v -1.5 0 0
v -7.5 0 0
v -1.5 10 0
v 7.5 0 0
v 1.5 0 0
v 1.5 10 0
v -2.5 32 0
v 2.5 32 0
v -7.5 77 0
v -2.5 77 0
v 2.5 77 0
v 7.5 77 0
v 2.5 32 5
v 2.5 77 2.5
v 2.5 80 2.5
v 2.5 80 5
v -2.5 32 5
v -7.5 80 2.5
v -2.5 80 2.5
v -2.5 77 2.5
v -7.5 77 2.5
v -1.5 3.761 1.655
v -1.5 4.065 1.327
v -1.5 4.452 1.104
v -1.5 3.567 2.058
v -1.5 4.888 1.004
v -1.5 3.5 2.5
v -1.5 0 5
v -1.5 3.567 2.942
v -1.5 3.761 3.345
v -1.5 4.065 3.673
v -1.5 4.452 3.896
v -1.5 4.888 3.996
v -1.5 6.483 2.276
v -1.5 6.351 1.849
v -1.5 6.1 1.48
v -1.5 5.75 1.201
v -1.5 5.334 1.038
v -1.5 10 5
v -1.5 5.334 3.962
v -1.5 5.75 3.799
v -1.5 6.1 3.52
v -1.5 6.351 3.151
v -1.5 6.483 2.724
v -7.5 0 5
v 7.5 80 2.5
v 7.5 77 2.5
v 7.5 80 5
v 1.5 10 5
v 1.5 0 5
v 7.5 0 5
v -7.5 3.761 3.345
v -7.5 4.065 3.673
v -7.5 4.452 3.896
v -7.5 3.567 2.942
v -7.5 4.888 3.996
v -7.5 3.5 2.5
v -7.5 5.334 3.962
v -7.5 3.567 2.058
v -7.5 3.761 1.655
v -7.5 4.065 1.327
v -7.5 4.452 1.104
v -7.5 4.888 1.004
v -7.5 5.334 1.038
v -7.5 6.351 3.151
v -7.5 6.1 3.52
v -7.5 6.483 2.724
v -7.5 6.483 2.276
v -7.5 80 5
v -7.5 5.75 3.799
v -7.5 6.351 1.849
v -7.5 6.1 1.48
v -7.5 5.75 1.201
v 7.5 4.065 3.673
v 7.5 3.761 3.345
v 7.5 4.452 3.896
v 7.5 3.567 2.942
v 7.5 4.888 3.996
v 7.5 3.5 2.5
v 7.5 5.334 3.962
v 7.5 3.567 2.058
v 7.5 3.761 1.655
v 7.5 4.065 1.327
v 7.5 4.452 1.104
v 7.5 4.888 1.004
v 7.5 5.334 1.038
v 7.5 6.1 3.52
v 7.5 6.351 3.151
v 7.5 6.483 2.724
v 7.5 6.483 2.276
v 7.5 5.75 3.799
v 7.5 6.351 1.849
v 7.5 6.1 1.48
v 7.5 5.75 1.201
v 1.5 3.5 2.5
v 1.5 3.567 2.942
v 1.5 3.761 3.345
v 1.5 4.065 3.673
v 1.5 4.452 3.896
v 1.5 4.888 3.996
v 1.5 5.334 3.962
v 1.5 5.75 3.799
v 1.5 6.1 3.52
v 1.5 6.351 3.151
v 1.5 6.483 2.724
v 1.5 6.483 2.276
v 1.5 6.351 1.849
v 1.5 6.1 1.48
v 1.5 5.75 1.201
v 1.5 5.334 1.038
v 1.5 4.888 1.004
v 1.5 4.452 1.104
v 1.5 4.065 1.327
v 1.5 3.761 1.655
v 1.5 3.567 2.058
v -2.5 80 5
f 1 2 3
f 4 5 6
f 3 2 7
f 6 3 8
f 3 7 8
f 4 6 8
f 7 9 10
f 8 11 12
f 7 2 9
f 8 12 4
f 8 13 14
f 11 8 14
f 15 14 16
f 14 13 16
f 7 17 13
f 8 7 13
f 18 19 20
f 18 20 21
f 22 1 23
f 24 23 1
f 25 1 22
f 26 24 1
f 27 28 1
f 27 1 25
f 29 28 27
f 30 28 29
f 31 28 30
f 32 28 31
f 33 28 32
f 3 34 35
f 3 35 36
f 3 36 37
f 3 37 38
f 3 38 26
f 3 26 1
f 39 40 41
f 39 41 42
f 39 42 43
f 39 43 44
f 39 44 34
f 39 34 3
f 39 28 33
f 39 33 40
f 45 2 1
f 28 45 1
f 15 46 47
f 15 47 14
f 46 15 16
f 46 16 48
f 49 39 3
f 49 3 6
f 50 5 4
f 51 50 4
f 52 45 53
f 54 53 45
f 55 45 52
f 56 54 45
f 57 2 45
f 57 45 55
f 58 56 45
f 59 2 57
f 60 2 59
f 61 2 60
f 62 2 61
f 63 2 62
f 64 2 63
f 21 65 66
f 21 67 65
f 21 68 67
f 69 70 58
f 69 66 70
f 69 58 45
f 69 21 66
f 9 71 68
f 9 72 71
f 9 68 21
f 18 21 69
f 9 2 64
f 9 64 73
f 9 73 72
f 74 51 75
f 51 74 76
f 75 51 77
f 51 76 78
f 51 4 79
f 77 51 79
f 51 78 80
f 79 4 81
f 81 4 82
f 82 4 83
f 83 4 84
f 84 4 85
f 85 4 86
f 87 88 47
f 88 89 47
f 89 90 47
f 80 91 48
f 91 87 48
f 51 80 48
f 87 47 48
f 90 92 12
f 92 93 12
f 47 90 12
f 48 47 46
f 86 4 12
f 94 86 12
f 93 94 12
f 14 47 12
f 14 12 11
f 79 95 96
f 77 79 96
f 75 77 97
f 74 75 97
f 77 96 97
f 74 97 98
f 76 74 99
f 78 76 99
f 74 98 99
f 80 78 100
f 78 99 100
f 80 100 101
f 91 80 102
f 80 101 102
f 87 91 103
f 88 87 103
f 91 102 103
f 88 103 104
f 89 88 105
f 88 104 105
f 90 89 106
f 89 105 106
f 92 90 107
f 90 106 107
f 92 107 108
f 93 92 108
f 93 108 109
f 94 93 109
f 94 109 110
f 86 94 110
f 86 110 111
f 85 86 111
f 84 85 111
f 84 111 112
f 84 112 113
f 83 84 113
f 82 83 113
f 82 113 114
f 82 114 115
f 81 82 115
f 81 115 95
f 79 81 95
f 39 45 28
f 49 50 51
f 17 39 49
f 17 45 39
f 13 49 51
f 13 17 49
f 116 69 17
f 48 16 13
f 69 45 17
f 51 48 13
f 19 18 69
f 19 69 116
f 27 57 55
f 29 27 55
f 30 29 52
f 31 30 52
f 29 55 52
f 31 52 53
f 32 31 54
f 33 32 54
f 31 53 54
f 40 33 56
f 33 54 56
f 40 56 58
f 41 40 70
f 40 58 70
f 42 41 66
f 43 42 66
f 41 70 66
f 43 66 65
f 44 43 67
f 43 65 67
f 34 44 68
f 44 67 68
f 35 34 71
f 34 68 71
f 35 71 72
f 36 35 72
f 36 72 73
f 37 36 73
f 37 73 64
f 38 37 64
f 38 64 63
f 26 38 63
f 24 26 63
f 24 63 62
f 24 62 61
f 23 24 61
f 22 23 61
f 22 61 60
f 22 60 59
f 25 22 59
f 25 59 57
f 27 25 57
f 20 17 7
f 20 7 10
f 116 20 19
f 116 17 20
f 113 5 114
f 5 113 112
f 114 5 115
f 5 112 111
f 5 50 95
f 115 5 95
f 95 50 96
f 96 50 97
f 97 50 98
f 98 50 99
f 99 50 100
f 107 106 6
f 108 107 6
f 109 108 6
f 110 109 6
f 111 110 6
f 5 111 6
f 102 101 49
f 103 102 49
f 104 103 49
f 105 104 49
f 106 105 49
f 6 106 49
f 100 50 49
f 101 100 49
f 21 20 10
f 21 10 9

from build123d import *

# Parameters (mm, degrees)
F0_W     = 15
F0_H     = 80
F1_DEPTH = 5
F2_W     = 5
F2_H     = 48
F3_DEPTH = 25
F4_W     = 5
F4_H     = 2.5
F5_DEPTH = 3
F6_W     = 5
F6_H     = 2.5
F7_DEPTH = 3
F8_W     = 3
F8_H     = 10
F9_DEPTH = 25
F11_D    = 3


with BuildPart() as f1:
    # F0 (on Top) → F1 (new body)
    with BuildSketch(Plane.XY):
        with Locations((0, 40)):
            Rectangle(F0_W, F0_H)
    extrude(amount=F1_DEPTH)

    # F2 (on face) → F3 (cut)
    with BuildSketch(Plane.XY.offset(5)):
        with Locations((0, 56)):
            Rectangle(F2_W, F2_H)
    extrude(amount=-F3_DEPTH, mode=Mode.SUBTRACT)

    # F4 (on face) → F5 (cut)
    with BuildSketch(Plane(origin=(0, 80, 0), x_dir=(-1, 0, 0), z_dir=(0, 1, 0))):
        with Locations((5, 1.25)):
            Rectangle(F4_W, F4_H)
    extrude(amount=-F5_DEPTH, mode=Mode.SUBTRACT)

    # F6 (on face) → F7 (cut)
    with BuildSketch(Plane(origin=(0, 80, 0), x_dir=(-1, 0, 0), z_dir=(0, 1, 0))):
        with Locations((-5, 1.25)):
            Rectangle(F6_W, F6_H)
    extrude(amount=-F7_DEPTH, mode=Mode.SUBTRACT)

    # F8 (on face) → F9 (cut)
    with BuildSketch(Plane.XY.offset(5)):
        with Locations((0, 5)):
            Rectangle(F8_W, F8_H)
    extrude(amount=-F9_DEPTH, mode=Mode.SUBTRACT)

    # F11 (through all)
    with Locations(Plane.YZ.offset(7.5)):
        with Locations((5, 2.5)):
            Hole(F11_D / 2)


solid = f1.part
